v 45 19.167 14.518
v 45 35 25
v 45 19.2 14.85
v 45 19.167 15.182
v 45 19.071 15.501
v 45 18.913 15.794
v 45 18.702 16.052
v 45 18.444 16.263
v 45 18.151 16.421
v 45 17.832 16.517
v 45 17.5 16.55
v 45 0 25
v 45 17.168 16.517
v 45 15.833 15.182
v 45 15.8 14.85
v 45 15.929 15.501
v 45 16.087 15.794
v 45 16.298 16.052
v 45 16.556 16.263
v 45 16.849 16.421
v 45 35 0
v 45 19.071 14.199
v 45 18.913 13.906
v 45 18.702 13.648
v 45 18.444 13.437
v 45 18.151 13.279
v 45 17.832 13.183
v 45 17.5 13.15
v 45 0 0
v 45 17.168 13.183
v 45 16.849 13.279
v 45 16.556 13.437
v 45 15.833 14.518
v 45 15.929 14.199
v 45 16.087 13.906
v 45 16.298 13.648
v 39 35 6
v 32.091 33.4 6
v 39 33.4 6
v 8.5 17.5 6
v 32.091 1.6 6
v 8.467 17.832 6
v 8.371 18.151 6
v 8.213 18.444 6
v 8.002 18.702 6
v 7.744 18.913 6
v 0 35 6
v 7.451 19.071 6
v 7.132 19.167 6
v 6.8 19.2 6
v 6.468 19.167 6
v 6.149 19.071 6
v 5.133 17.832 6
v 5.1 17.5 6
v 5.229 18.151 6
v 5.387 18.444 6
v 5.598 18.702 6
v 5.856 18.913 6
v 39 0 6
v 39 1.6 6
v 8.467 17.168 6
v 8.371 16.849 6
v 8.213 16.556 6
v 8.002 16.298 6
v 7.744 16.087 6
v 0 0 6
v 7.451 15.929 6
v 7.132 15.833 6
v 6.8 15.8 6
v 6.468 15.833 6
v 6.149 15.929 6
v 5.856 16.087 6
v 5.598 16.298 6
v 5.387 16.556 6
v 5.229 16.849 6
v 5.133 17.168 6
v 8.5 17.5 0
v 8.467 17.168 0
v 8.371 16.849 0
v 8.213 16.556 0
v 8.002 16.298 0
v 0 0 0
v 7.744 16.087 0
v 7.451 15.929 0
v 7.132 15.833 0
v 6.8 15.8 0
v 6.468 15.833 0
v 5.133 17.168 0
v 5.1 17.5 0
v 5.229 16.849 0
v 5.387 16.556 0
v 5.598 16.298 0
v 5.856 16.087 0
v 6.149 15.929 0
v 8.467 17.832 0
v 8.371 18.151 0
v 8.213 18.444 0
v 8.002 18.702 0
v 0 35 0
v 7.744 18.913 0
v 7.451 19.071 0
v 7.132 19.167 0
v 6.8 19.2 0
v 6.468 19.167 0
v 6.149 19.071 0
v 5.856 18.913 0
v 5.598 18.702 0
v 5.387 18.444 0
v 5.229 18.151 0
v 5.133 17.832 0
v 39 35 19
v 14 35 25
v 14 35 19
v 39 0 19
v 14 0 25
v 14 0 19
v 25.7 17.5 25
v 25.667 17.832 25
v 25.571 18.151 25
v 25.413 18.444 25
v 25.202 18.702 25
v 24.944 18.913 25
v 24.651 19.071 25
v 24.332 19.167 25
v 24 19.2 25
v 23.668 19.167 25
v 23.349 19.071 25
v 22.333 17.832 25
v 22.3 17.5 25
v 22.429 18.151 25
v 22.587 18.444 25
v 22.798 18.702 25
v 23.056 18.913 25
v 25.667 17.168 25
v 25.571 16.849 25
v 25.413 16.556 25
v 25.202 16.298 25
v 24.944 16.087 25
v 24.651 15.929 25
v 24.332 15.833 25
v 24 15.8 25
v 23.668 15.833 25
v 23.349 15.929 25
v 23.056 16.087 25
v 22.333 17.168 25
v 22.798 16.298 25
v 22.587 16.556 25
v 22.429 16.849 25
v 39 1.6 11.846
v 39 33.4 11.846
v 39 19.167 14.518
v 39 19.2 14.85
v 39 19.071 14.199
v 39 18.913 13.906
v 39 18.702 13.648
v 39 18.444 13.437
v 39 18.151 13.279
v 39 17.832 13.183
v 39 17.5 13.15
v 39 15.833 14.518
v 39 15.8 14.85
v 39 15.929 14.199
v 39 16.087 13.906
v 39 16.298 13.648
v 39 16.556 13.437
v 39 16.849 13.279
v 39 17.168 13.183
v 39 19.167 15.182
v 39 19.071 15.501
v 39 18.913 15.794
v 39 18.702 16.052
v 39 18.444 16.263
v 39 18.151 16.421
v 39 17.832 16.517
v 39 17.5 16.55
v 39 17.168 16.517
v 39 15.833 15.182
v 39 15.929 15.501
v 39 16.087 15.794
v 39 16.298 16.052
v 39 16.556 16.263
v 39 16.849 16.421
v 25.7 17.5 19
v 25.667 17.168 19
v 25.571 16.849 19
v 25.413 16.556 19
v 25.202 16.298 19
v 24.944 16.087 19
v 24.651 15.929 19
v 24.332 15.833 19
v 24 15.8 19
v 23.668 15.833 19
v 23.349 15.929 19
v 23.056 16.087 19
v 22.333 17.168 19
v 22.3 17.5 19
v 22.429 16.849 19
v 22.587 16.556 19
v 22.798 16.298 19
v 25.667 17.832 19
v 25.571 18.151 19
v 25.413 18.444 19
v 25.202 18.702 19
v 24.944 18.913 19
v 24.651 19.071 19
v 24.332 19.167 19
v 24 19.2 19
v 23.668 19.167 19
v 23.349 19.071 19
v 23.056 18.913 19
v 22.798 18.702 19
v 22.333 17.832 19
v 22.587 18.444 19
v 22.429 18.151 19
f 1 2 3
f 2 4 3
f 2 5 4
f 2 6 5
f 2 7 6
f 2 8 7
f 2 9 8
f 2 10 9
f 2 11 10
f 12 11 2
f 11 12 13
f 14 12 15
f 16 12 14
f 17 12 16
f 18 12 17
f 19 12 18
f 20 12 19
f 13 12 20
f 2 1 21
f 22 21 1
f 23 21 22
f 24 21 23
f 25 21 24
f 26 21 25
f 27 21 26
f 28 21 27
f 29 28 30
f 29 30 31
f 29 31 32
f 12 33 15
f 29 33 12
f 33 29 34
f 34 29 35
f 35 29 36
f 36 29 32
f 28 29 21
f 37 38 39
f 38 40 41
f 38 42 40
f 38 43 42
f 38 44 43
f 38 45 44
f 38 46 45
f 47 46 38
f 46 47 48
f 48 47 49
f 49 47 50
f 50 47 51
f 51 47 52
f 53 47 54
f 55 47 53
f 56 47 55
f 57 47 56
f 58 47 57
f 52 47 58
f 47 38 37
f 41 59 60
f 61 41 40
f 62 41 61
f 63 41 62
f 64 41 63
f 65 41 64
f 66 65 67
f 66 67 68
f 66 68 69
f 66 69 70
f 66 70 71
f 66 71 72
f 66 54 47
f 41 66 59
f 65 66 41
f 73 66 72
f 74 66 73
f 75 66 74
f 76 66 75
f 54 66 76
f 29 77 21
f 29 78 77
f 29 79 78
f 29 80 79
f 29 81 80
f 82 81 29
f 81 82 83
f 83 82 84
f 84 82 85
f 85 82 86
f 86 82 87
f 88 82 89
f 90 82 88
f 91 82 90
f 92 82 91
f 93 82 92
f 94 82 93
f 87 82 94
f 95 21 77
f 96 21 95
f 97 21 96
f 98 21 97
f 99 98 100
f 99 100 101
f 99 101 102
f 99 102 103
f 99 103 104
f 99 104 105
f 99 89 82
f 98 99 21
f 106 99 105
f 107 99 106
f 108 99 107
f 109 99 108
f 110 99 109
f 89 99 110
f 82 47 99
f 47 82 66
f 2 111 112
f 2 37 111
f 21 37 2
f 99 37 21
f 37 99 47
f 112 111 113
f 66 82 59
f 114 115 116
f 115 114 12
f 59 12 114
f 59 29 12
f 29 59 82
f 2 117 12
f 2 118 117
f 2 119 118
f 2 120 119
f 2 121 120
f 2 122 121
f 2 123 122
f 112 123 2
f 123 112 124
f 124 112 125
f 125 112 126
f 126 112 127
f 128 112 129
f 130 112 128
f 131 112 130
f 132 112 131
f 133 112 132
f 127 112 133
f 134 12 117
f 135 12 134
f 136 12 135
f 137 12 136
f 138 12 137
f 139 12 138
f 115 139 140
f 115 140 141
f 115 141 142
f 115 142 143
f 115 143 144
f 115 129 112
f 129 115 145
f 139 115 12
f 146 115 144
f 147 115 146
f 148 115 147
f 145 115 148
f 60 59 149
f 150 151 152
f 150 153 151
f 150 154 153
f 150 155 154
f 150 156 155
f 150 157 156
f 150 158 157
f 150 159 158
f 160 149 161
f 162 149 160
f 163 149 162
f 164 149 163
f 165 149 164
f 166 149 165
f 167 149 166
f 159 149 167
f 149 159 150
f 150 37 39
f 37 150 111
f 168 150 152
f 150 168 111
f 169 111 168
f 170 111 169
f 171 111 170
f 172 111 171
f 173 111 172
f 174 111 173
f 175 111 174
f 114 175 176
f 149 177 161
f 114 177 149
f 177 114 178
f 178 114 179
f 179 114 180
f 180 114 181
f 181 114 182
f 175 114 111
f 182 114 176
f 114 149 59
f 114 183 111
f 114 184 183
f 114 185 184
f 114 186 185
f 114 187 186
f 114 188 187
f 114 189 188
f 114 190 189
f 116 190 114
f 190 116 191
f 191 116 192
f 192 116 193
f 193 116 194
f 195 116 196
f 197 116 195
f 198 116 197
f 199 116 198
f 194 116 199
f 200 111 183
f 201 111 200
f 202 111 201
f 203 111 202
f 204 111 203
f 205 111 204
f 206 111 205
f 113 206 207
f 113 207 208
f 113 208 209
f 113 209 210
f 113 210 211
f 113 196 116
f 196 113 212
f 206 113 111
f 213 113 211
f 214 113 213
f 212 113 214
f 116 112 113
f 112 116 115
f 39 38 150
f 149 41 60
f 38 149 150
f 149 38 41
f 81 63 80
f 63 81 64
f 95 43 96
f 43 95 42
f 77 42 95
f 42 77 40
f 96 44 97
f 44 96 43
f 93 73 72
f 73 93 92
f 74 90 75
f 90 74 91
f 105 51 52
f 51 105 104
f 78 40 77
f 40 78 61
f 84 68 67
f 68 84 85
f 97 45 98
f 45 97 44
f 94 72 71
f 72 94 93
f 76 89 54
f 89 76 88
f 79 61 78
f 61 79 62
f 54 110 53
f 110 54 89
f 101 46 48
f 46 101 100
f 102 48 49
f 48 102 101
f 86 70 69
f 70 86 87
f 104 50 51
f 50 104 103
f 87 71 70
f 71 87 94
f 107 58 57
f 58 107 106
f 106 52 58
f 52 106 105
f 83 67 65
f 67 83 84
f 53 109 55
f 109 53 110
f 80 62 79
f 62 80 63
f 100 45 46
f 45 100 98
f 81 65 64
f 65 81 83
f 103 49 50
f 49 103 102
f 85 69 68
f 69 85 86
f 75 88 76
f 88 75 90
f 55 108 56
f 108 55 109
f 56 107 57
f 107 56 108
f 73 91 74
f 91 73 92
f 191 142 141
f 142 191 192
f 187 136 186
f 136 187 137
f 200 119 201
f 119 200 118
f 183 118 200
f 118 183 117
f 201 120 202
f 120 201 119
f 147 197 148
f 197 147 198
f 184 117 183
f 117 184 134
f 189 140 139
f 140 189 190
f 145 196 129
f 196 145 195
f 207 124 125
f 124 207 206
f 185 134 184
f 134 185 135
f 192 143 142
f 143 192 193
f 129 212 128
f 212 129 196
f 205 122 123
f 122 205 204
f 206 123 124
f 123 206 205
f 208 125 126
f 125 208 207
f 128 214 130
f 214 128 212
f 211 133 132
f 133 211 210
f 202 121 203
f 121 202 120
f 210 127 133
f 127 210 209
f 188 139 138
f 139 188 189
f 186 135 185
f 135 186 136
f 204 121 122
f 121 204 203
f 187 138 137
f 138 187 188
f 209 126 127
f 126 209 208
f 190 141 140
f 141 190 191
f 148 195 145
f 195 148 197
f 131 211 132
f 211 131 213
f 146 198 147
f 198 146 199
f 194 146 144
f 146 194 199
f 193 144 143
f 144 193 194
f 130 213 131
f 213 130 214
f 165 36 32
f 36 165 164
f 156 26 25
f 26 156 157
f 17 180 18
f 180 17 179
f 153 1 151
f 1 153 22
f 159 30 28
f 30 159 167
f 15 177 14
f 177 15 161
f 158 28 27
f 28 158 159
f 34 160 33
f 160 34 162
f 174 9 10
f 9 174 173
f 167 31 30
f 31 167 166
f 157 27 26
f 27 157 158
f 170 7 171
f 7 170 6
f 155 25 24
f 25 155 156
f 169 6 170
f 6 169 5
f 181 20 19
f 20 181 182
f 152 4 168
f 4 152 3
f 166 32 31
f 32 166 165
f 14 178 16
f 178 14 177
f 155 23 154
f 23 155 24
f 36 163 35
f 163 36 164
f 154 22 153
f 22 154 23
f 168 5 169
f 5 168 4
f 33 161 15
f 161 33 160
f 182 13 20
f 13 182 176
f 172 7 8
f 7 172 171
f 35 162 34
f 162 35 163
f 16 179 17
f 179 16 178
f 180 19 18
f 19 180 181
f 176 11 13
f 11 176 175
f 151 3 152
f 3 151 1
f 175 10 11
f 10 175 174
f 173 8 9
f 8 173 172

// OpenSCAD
$fn = 32;

// ----------------------------------------------------------------------
// Z-bracket: 45 x 35 x 25 mm
// ----------------------------------------------------------------------

// --- parameters (mm) ---
foot_len = 45;            // lower foot length, X
top_len = 25;             // upper foot length, X
depth = 35;               // bracket width, Y
step_h = 25;              // overall rise, Z
plate_t = 6;              // plate thickness
hole_d = 3.4;             // clearance for M3
rib_len = 8.8;            // gusset leg
rib_sink = 1.6;           // gusset overlap into the plates

module hole_z(px, py, z0) {
  translate([px, py, z0 - 2.5]) cylinder(h = plate_t + 5, d = hole_d);
}
module hole_x(py, pz) {
  translate([-2.5, py, pz]) rotate([0, 90, 0]) cylinder(h = plate_t + 5, d = hole_d);
}
module gusset(x0) {
  translate([x0, depth - rib_sink, 0])
    rotate([90, 0, 0])
      linear_extrude(height = depth - 2 * rib_sink)
        polygon(points = [[rib_sink, plate_t - rib_sink],
                          [rib_sink, plate_t - rib_sink + rib_len],
                          [-rib_len, plate_t - rib_sink]]);
}

difference() {
  union() {
    cube([foot_len, depth, plate_t]);
    /* web, overlapping the lower foot */
    translate([foot_len - plate_t, 0, 0]) cube([plate_t, depth, step_h]);
    /* upper foot, sunk into the web */
    translate([foot_len - plate_t - top_len, 0, step_h - plate_t]) cube([top_len + plate_t, depth, plate_t]);
    gusset(foot_len - plate_t);
  }
  hole_z(6.8, 17.5, 0);
  translate([foot_len - plate_t - 15, 0, 0]) hole_z(0, 17.5, step_h - plate_t);
  translate([foot_len - plate_t, 0, 0]) hole_x(17.5, 14.85);
}
